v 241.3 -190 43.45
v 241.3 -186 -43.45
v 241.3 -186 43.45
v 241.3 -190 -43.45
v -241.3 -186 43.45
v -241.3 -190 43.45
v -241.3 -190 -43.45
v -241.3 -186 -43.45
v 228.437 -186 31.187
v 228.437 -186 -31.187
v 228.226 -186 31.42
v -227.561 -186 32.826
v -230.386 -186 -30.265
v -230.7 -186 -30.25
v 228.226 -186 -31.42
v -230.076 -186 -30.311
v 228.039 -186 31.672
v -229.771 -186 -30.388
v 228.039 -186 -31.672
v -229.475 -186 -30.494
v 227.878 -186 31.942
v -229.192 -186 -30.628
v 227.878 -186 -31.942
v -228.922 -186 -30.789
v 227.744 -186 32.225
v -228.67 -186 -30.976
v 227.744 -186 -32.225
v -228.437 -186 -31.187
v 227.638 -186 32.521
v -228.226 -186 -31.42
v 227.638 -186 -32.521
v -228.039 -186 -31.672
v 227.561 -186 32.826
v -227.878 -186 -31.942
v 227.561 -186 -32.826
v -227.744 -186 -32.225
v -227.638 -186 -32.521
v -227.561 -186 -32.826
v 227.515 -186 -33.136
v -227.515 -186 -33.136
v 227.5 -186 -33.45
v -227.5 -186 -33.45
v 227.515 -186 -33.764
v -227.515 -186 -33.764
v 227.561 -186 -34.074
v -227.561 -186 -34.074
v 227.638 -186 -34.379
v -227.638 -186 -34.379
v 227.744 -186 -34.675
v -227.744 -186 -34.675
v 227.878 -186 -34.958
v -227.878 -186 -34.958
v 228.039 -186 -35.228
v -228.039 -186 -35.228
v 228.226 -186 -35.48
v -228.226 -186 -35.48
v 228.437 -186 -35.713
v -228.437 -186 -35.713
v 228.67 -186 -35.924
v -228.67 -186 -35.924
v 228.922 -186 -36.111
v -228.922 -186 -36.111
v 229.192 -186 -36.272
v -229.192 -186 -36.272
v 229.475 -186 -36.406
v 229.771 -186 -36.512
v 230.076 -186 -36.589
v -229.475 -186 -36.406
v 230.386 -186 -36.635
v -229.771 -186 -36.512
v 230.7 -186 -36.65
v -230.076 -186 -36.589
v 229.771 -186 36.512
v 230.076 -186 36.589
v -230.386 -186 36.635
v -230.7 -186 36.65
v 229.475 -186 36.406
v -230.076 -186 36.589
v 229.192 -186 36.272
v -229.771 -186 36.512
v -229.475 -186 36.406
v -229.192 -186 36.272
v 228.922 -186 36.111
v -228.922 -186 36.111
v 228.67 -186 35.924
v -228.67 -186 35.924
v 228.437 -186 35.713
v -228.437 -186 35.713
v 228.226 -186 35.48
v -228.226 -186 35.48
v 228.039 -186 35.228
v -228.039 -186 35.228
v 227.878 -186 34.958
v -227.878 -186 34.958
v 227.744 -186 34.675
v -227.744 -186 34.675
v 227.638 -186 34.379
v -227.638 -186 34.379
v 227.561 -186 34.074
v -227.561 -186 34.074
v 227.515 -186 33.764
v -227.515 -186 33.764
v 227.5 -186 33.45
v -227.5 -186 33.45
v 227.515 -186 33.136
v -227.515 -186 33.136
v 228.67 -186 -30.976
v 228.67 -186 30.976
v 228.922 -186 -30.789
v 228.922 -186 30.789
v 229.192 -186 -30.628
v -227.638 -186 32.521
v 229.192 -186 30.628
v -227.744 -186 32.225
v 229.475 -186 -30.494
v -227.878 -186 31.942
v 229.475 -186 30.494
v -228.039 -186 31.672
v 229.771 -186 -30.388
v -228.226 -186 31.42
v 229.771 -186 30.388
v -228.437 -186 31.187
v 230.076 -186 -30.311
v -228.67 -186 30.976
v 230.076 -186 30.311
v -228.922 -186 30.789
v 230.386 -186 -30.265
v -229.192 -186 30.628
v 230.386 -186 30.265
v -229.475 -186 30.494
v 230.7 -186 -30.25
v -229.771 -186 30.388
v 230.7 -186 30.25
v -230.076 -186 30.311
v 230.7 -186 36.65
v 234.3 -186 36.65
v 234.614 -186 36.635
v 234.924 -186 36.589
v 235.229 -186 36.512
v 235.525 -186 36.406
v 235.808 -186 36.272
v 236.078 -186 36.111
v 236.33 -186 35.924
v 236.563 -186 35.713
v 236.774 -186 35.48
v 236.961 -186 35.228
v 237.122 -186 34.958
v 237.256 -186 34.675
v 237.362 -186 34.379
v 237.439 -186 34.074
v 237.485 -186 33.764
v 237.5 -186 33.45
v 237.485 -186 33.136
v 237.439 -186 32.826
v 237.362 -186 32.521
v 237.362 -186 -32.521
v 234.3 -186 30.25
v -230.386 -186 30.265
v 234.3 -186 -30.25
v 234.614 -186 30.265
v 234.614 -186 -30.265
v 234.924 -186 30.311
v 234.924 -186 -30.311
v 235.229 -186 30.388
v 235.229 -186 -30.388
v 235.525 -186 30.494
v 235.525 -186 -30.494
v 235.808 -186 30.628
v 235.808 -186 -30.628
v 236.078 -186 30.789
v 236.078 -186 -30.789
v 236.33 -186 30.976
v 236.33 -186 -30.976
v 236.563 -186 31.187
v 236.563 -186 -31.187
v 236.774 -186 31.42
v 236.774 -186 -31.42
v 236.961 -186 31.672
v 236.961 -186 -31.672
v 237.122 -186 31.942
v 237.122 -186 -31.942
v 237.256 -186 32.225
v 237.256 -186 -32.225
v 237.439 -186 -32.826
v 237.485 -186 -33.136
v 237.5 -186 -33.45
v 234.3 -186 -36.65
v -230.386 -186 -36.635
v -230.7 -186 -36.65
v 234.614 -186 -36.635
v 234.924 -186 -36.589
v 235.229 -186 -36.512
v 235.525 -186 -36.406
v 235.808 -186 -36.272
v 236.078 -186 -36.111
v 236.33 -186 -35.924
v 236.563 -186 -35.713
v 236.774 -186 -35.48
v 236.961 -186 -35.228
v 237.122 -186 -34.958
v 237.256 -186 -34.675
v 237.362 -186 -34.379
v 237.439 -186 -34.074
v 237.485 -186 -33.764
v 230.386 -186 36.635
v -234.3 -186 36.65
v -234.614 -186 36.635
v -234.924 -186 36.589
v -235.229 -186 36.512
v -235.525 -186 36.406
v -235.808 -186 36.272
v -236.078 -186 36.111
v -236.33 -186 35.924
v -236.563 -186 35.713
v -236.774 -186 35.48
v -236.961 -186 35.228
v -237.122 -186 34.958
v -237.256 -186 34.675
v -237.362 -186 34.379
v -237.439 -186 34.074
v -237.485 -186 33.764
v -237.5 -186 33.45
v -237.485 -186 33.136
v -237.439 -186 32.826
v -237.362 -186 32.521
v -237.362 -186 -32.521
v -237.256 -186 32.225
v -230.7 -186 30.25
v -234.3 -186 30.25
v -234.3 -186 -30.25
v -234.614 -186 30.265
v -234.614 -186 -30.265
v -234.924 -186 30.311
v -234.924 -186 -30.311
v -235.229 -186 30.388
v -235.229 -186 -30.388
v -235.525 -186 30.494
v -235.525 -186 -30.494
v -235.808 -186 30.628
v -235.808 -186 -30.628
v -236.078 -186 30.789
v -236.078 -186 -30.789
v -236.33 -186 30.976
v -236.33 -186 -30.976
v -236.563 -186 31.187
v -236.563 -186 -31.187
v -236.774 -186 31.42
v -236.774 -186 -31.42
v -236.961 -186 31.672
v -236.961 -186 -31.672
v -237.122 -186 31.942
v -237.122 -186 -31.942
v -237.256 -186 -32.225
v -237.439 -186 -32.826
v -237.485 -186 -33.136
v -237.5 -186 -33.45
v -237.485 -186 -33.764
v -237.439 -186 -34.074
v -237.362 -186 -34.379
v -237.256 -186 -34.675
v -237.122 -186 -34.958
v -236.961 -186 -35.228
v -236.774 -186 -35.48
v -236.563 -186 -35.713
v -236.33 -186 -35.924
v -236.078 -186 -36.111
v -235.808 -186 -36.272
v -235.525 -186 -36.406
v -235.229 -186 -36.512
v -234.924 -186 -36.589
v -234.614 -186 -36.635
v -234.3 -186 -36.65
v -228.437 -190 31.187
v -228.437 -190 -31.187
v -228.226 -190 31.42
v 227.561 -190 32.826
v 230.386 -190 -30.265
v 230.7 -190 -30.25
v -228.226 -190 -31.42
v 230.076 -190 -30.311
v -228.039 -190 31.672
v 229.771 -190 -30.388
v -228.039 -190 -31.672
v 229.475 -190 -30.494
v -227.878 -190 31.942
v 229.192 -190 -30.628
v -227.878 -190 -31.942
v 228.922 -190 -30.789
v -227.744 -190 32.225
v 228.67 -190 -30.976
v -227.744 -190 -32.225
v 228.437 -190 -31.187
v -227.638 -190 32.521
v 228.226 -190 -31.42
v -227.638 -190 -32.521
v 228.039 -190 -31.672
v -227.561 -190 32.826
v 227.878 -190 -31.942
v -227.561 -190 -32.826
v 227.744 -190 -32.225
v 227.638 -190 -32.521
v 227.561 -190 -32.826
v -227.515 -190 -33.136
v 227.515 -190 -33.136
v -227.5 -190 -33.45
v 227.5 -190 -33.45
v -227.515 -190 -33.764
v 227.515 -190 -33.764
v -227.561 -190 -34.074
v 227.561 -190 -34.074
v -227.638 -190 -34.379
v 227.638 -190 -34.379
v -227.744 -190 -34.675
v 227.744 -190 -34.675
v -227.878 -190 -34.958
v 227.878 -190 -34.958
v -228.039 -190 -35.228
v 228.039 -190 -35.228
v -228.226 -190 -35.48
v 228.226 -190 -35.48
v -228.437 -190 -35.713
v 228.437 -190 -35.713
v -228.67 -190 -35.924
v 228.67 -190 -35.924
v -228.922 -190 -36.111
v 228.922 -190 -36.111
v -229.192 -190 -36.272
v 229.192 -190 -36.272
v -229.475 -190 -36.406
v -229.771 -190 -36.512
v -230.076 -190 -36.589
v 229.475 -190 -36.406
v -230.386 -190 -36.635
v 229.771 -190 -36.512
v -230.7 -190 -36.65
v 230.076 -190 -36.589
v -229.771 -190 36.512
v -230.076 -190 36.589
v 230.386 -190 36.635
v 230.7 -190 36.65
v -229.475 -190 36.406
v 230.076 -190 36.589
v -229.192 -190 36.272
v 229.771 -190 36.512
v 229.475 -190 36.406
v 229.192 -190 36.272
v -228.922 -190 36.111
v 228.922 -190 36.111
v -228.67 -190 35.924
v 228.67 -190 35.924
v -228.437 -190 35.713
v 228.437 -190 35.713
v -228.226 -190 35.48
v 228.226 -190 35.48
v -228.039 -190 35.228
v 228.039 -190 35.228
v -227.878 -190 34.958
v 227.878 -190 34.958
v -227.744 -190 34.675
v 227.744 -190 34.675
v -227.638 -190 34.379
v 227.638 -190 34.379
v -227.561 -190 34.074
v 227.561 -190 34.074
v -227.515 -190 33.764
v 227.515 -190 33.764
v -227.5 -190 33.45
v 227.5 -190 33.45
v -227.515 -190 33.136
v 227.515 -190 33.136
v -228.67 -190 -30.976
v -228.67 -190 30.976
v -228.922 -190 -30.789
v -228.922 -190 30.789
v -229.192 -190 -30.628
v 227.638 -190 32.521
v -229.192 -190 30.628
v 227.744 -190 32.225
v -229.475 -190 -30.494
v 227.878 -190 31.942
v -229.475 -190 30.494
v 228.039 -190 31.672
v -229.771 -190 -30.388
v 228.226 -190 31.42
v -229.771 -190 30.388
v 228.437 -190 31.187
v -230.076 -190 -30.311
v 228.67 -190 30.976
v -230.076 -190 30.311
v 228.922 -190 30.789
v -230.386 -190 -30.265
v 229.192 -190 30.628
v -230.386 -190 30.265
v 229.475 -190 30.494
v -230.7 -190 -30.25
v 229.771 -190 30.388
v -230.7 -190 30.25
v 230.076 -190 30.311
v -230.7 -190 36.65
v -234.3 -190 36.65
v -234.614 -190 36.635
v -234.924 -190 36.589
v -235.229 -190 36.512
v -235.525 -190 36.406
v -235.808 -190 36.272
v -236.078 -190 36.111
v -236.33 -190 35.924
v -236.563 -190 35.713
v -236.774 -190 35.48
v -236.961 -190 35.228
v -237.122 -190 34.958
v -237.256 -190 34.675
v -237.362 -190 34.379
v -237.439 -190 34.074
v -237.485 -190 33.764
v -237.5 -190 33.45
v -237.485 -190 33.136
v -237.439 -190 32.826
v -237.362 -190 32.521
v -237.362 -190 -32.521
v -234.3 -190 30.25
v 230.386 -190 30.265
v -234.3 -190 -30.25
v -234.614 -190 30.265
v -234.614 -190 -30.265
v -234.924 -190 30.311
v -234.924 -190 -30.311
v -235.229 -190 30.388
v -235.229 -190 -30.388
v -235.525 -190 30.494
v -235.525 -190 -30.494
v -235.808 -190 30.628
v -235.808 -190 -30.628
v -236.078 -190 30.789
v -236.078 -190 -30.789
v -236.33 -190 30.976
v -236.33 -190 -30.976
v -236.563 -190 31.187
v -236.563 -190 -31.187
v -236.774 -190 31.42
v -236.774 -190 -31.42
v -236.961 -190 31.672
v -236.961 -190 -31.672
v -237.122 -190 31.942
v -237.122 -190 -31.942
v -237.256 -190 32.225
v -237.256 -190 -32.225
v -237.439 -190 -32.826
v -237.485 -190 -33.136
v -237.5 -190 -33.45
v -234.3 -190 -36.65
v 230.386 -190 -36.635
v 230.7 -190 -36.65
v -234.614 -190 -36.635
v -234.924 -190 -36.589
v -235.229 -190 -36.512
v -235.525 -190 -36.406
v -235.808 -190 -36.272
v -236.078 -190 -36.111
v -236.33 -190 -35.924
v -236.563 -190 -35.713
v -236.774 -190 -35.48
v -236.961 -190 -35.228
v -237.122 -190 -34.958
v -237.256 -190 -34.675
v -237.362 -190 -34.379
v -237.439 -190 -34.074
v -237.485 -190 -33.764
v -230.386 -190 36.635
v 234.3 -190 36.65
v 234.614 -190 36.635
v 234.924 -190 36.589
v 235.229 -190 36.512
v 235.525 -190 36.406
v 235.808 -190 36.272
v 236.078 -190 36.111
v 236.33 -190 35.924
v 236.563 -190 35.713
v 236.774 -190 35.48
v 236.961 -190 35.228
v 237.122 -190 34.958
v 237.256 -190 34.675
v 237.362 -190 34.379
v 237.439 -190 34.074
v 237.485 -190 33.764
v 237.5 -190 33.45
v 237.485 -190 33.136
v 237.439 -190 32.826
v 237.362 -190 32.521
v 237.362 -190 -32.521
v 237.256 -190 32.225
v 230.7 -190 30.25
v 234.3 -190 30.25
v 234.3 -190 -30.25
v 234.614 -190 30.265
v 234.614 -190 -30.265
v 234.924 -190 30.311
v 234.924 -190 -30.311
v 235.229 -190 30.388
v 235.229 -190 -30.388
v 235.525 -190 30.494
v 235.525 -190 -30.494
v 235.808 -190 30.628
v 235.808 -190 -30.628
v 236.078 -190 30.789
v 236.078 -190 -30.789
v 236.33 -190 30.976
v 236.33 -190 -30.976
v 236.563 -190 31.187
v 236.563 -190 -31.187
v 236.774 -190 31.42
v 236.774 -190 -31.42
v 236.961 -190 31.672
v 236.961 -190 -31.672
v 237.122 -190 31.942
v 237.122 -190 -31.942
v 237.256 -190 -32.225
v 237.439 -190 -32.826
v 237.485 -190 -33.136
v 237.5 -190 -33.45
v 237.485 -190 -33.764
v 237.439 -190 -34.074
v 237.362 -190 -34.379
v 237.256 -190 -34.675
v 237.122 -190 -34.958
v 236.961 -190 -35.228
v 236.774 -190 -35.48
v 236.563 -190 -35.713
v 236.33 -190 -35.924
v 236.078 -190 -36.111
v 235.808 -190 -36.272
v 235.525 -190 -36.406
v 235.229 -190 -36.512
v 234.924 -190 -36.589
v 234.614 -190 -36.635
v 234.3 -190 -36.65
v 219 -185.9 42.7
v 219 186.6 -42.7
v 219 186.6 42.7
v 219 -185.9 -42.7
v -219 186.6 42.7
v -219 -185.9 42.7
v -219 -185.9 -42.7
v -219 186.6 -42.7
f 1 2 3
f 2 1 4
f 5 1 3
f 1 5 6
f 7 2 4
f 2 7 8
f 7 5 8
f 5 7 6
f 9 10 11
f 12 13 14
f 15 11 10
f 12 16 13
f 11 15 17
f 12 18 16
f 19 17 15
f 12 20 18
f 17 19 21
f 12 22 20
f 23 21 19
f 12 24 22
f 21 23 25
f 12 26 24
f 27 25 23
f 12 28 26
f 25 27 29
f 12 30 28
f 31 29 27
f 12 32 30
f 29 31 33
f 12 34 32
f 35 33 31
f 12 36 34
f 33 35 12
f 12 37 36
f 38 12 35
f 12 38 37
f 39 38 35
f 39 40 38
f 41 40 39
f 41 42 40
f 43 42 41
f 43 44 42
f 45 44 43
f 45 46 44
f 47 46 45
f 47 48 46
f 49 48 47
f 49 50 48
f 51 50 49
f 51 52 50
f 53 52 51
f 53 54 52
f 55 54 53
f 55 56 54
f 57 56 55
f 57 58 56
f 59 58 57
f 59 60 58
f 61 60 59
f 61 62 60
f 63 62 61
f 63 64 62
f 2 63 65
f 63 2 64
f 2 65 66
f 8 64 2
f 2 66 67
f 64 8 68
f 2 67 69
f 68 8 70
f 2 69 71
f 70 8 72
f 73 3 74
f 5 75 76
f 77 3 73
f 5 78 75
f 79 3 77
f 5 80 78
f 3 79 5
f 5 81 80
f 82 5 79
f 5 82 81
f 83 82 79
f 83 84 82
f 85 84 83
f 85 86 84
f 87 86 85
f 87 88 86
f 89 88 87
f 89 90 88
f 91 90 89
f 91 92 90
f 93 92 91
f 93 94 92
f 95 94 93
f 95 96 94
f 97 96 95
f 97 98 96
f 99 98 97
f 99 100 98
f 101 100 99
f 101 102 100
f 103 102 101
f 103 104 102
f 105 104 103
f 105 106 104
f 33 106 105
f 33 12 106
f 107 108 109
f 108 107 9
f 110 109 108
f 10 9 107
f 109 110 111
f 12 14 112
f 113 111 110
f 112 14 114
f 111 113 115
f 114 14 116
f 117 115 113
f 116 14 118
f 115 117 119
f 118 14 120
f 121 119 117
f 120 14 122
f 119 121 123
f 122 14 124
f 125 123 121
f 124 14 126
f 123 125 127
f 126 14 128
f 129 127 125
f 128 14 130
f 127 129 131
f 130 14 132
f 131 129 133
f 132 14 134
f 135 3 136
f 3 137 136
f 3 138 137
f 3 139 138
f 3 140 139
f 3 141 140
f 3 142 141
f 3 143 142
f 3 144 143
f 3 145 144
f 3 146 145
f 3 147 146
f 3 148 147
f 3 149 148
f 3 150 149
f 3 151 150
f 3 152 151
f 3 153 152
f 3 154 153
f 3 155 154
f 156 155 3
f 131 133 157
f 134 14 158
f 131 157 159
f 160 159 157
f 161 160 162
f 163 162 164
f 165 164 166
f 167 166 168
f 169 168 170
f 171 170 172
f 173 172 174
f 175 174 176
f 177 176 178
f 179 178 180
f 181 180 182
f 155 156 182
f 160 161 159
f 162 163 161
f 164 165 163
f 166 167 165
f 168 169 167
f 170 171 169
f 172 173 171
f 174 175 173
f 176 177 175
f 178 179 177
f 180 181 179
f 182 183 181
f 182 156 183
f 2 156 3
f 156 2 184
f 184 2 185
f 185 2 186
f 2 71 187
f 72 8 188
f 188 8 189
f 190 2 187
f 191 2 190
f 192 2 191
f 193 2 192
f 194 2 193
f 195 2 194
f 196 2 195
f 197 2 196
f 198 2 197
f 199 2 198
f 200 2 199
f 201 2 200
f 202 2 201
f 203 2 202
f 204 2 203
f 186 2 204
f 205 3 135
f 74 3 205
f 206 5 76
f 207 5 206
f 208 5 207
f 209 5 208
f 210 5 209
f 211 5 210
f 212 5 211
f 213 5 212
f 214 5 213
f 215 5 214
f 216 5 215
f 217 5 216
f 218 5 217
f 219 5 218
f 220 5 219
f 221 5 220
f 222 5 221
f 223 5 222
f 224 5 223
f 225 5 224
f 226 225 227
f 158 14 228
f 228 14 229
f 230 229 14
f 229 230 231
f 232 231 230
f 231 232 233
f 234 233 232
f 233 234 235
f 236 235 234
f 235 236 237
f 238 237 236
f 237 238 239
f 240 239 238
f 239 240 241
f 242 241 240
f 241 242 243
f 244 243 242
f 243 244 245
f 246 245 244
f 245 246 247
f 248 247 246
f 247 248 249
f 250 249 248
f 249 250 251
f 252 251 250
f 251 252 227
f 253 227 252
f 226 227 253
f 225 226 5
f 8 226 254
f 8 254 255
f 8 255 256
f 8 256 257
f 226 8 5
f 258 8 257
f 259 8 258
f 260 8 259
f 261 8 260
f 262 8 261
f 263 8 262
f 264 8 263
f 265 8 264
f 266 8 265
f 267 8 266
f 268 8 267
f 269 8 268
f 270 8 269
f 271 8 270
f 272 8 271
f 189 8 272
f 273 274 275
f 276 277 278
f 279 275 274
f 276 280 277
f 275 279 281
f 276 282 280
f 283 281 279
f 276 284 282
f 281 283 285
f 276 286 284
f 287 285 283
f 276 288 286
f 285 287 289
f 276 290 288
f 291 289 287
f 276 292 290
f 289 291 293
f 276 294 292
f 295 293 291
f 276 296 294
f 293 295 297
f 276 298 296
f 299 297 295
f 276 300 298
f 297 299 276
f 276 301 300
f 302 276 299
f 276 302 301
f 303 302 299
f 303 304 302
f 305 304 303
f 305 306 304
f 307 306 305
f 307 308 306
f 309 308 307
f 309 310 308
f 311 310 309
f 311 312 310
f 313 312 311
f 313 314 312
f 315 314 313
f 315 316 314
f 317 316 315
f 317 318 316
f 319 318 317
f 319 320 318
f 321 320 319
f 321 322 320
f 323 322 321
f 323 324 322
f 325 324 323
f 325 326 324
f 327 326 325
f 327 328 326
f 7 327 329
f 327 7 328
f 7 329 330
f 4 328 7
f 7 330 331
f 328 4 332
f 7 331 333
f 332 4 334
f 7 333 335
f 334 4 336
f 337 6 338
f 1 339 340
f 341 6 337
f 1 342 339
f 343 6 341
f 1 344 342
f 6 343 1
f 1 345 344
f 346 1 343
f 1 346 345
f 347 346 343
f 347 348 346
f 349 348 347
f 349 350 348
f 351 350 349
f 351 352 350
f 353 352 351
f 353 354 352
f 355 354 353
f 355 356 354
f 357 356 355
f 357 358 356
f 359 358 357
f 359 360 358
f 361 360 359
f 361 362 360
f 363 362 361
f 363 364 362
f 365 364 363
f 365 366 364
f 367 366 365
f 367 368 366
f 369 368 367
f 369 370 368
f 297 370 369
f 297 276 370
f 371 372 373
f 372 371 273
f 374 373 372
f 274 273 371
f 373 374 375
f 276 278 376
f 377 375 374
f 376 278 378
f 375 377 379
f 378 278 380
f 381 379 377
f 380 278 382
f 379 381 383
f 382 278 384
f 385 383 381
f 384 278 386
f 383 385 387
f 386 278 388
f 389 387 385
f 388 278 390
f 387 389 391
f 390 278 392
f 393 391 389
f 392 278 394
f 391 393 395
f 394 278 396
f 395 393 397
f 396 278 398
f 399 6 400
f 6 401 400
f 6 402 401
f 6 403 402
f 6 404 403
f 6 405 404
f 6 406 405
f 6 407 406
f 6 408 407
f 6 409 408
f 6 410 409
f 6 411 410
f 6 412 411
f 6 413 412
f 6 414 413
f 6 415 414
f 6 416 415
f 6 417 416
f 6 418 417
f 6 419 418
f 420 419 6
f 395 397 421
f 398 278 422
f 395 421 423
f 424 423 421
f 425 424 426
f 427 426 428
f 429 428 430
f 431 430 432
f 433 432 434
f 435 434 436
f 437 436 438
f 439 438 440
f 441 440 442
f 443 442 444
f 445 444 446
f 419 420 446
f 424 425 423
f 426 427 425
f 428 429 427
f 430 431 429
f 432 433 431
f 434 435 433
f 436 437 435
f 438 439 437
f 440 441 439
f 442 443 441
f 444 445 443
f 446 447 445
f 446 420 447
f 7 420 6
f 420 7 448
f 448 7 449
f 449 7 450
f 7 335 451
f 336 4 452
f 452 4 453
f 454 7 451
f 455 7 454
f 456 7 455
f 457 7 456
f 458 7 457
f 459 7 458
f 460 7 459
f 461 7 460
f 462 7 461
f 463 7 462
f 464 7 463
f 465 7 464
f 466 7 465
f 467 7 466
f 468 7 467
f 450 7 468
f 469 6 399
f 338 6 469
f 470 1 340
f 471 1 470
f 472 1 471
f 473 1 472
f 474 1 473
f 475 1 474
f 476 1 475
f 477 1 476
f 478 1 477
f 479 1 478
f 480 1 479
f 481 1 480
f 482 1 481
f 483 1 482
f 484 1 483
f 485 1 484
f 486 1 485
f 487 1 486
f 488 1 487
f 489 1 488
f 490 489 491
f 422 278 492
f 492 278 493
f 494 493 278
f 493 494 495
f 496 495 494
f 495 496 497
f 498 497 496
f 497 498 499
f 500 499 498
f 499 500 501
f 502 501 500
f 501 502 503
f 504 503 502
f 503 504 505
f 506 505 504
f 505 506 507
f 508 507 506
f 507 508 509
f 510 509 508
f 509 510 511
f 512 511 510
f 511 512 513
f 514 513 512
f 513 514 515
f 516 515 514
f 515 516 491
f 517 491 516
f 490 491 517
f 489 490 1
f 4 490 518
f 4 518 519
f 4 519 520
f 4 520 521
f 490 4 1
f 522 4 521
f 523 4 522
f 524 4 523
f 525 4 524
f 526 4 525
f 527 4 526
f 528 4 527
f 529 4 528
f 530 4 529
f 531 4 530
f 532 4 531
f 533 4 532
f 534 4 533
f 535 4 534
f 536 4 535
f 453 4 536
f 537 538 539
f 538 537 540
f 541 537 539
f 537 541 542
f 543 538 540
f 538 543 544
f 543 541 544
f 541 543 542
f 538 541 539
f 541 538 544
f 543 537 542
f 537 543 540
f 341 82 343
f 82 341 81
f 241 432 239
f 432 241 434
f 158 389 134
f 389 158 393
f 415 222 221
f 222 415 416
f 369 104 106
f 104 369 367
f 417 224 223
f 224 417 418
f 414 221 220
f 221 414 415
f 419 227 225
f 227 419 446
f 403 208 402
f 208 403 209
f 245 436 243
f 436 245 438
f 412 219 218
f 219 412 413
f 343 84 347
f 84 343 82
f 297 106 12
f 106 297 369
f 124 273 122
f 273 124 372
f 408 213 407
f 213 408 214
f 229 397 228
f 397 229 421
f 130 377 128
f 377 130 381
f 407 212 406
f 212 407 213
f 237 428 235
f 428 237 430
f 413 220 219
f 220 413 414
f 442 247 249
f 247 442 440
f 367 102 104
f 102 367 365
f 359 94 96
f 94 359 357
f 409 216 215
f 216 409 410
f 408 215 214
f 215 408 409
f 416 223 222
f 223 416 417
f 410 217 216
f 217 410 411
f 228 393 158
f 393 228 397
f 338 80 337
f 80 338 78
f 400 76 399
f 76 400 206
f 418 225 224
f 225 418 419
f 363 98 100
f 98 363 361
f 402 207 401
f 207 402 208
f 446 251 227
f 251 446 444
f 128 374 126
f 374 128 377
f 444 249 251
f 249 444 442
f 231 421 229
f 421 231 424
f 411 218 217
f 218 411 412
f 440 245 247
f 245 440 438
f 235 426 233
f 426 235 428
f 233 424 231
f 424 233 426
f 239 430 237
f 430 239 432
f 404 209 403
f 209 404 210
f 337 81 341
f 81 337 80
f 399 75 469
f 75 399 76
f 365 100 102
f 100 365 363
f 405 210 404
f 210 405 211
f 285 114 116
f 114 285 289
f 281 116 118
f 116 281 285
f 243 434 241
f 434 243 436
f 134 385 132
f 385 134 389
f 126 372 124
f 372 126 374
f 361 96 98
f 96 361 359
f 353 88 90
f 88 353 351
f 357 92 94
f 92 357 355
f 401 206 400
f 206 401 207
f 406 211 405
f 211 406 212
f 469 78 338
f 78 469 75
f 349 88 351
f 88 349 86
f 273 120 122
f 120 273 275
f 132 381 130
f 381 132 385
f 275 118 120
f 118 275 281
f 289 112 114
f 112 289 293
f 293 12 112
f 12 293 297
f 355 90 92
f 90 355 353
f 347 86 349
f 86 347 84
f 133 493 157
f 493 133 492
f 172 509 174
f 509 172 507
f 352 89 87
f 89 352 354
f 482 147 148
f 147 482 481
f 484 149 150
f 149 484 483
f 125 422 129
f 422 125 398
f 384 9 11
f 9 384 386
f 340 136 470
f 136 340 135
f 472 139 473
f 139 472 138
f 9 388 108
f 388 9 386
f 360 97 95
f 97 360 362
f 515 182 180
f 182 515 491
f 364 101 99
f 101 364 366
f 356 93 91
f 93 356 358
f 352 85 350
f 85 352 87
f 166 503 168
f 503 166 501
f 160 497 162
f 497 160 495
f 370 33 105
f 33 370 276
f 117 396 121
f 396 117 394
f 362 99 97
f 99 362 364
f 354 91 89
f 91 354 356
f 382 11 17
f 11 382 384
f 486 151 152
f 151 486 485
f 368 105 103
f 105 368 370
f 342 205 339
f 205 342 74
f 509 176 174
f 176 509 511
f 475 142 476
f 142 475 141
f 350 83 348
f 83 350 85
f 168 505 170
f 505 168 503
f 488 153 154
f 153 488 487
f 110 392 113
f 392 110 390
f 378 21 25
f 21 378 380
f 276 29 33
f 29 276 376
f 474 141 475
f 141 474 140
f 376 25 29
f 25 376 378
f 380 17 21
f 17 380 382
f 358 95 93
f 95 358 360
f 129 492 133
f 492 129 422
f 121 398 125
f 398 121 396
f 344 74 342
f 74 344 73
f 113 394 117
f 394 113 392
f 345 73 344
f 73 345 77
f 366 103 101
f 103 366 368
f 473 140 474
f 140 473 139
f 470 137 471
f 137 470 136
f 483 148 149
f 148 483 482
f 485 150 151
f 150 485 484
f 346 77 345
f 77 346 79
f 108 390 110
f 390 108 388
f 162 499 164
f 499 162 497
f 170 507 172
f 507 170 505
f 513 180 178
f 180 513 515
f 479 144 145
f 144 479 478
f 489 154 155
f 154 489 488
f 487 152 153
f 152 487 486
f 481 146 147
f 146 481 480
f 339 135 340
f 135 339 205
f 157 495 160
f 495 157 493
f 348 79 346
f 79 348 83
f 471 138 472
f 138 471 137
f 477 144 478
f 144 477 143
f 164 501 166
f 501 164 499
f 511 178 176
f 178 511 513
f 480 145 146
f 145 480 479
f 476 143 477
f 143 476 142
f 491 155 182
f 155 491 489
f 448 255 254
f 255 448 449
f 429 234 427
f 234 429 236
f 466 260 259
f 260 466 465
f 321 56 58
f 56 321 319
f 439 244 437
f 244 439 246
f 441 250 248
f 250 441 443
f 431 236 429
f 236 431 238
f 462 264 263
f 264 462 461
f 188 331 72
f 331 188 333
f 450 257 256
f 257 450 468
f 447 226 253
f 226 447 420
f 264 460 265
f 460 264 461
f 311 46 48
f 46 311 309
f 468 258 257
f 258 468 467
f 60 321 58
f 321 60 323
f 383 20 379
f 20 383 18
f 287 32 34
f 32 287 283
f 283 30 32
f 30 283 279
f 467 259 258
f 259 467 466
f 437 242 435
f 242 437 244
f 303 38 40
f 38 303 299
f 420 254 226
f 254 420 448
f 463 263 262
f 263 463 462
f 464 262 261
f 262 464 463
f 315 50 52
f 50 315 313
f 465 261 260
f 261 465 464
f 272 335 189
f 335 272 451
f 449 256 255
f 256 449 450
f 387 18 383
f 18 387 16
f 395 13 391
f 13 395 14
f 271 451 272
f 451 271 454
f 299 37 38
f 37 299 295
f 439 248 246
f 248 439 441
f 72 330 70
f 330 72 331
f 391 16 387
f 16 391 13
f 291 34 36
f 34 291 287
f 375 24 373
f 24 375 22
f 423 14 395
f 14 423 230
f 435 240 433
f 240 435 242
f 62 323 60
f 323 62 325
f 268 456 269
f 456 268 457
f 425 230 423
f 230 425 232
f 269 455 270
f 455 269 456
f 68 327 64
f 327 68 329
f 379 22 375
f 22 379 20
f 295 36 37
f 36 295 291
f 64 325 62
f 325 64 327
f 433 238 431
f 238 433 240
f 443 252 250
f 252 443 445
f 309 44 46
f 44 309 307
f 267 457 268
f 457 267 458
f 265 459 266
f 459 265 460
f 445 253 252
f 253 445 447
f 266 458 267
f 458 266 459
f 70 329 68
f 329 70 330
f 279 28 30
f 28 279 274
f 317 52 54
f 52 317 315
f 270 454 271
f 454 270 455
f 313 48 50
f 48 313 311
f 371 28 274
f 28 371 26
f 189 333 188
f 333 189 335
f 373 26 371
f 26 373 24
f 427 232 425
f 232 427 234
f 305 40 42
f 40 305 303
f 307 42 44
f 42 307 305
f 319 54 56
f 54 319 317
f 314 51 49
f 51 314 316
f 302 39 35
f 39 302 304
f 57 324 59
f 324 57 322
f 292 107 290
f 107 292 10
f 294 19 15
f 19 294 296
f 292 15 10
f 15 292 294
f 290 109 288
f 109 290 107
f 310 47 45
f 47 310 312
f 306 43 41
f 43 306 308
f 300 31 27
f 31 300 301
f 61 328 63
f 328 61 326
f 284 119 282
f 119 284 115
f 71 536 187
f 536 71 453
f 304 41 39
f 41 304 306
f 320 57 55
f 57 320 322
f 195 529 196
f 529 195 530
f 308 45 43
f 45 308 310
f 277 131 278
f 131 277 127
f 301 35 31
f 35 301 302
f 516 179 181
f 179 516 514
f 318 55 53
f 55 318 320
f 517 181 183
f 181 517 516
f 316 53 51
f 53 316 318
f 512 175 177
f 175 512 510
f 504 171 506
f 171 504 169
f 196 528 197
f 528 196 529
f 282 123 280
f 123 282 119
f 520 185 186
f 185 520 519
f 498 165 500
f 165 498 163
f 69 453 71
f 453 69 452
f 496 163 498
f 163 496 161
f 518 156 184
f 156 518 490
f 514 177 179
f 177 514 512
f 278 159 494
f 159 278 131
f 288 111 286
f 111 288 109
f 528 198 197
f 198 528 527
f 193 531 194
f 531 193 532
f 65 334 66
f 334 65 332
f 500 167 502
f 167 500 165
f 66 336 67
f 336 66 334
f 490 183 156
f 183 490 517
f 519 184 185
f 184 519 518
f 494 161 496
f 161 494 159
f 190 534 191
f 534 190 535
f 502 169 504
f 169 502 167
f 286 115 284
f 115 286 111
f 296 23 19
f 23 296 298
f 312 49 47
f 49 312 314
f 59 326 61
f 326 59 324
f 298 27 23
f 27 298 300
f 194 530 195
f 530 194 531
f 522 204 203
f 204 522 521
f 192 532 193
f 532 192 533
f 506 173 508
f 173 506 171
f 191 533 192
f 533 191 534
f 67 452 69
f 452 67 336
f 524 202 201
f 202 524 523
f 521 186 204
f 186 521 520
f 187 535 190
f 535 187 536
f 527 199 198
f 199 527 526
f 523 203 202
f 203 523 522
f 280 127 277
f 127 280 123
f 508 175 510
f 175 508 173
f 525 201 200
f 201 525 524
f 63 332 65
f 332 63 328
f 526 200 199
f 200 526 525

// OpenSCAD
// ============================================================================
// Atom Lithography Machine — Parametric OpenSCAD Module (S3.2-02)
// ============================================================================
// part_id           : S3.2-02
// parent_bom_id     : S3.2
// subsystem         : S3
// part_name         : Kilitli CR-RC2 sekillendirici (1.2 us, CS=CP=600 pF) + karsilastirici + trim DAC (Exp127)
// material          : Al 6061
// temp_stage        : 300 K (vakum-disi)
// vacuum_grade      : Atmosfer
// tolerance         : ±0.5 mV esik
// computed_mass_kg  : 7.70782
// envelope_mm       : 482.600 x 400.900 x 86.900
// design_maturity   : M0_M1_DETAILED_CAD_DESIGN_ONLY
// no_lab_measurement: true
// iec61508_certified: false
// semi_s2_certified : false
// Units: millimeters (mm)
// ============================================================================

$fn = 64;

// Nominal bounding envelope parameters (mm)
bbox_x = 482.6000;
bbox_y = 400.9000;
bbox_z = 86.9000;

// Part-specific parametric dimensions
n_shaper_cards = 16;
card_length_mm = 185.0;
card_width_mm = 135.0;
rack_u_height = 2;

// Interface / port parameters (mm)

module part_S3_2_02() {
  difference() {
    union() {
      // 19-inch EIA-310 2U front faceplate (482.6 x 86.9 mm, facing -Y)
      translate([0.000, -188.000, 0.000]) cube([482.600, 4.000, 86.900], center=true);
      // Hollow EMI-shielded chassis body
      translate([0.000, 0.350, 0.000]) cube([438.000, 372.500, 85.400], center=true);
    }
    // EIA-310 upper-left rack ear slot
    translate([-232.500, -188.000, 33.450]) rotate([90.000, 0.000, 0.000]) {
      hull() {
        translate([-1.800, 0, 0]) cylinder(d=6.400, h=8.000, center=true);
        translate([1.800, 0, 0]) cylinder(d=6.400, h=8.000, center=true);
      }
    }
    // EIA-310 upper-right rack ear slot
    translate([232.500, -188.000, 33.450]) rotate([90.000, 0.000, 0.000]) {
      hull() {
        translate([-1.800, 0, 0]) cylinder(d=6.400, h=8.000, center=true);
        translate([1.800, 0, 0]) cylinder(d=6.400, h=8.000, center=true);
      }
    }
    // EIA-310 lower-left rack ear slot
    translate([-232.500, -188.000, -33.450]) rotate([90.000, 0.000, 0.000]) {
      hull() {
        translate([-1.800, 0, 0]) cylinder(d=6.400, h=8.000, center=true);
        translate([1.800, 0, 0]) cylinder(d=6.400, h=8.000, center=true);
      }
    }
    // EIA-310 lower-right rack ear slot
    translate([232.500, -188.000, -33.450]) rotate([90.000, 0.000, 0.000]) {
      hull() {
        translate([-1.800, 0, 0]) cylinder(d=6.400, h=8.000, center=true);
        translate([1.800, 0, 0]) cylinder(d=6.400, h=8.000, center=true);
      }
    }
  }
}

// World assembly mounting transform (global machine frame, mm / deg):
// translate([1480.000, -220.000, 479.000]) rotate([0.000, 0.000, 0.000]) part_S3_2_02();

part_S3_2_02();
